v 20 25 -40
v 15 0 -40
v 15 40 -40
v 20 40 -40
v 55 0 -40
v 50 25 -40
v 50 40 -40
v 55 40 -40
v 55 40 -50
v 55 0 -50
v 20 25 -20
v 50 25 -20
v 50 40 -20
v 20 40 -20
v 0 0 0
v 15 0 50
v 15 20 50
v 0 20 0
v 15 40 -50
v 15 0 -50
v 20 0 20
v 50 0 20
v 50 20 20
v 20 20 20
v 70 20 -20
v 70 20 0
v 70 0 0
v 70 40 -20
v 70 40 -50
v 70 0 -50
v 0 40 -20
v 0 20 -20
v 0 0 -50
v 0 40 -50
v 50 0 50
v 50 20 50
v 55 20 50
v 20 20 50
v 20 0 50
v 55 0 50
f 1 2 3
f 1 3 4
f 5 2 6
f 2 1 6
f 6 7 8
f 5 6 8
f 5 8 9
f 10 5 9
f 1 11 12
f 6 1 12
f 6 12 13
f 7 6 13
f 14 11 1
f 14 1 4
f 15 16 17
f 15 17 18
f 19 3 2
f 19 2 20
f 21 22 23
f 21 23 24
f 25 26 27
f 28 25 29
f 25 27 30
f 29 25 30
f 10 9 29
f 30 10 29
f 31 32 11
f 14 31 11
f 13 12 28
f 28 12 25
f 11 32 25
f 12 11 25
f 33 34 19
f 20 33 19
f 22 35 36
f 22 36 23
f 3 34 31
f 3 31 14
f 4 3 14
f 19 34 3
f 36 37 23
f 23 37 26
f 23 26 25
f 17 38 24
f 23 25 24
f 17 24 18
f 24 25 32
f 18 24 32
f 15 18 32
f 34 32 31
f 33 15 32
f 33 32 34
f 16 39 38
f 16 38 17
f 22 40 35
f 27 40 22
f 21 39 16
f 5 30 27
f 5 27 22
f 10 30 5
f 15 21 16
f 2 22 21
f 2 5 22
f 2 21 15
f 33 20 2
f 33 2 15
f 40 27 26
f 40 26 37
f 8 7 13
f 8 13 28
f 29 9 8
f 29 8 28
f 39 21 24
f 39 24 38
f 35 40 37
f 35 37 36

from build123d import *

# Parameters (mm, degrees)
BOSS_EXTRUDE1_DEPTH = 20
SKETCH2_W           = 70
SKETCH2_H           = 30
BOSS_EXTRUDE2_DEPTH = 20
CUT_EXTRUDE1_REACH  = 96.868
SKETCH3_W           = 40
SKETCH3_H           = 10
CUT_EXTRUDE2_REACH  = 108.771
SKETCH4_W           = 30
SKETCH4_H           = 15


with BuildPart() as part:
    # Sketch1 → Boss-Extrude1 (new body)
    with BuildSketch(Plane(origin=(0, 0, 0), x_dir=(1, 0, 0), z_dir=(0, 1, 0))):
        Polygon((0, 0), (0, 50), (70, 50), (70, 0), (55, -50), (50, -50), (50, -20), (20, -20), (20, -50), (15, -50), align=None)
    extrude(amount=BOSS_EXTRUDE1_DEPTH)

    # Sketch2 → Boss-Extrude2 (add)
    with BuildSketch(Plane(origin=(0, 20, 0), x_dir=(1, 0, 0), z_dir=(0, 1, 0))):
        with Locations((35, 35)):
            Rectangle(SKETCH2_W, SKETCH2_H)
    extrude(amount=BOSS_EXTRUDE2_DEPTH)

    # Sketch3 → Cut-Extrude1 (cut, up to next)
    with BuildSketch(Plane(origin=(0, 40, 0), x_dir=(1, 0, 0), z_dir=(0, 1, 0)), mode=Mode.PRIVATE) as cut_extrude1_sk1:
        with Locations((35, 45)):
            Rectangle(SKETCH3_W, SKETCH3_H)
    cut_extrude1_tool1 = extrude(cut_extrude1_sk1.sketch, amount=-CUT_EXTRUDE1_REACH, mode=Mode.PRIVATE) & part.part
    add(cut_extrude1_tool1.solids().sort_by_distance((35, 40, -45))[0], mode=Mode.SUBTRACT)

    # Sketch4 → Cut-Extrude2 (cut, up to next)
    with BuildSketch(Plane.XY.offset(-20), mode=Mode.PRIVATE) as cut_extrude2_sk1:
        with Locations((35, 32.5)):
            Rectangle(SKETCH4_W, SKETCH4_H)
    cut_extrude2_tool1 = extrude(cut_extrude2_sk1.sketch, amount=-CUT_EXTRUDE2_REACH, mode=Mode.PRIVATE) & part.part
    add(cut_extrude2_tool1.solids().sort_by_distance((35, 32.5, -20))[0], mode=Mode.SUBTRACT)


solid = part.part
